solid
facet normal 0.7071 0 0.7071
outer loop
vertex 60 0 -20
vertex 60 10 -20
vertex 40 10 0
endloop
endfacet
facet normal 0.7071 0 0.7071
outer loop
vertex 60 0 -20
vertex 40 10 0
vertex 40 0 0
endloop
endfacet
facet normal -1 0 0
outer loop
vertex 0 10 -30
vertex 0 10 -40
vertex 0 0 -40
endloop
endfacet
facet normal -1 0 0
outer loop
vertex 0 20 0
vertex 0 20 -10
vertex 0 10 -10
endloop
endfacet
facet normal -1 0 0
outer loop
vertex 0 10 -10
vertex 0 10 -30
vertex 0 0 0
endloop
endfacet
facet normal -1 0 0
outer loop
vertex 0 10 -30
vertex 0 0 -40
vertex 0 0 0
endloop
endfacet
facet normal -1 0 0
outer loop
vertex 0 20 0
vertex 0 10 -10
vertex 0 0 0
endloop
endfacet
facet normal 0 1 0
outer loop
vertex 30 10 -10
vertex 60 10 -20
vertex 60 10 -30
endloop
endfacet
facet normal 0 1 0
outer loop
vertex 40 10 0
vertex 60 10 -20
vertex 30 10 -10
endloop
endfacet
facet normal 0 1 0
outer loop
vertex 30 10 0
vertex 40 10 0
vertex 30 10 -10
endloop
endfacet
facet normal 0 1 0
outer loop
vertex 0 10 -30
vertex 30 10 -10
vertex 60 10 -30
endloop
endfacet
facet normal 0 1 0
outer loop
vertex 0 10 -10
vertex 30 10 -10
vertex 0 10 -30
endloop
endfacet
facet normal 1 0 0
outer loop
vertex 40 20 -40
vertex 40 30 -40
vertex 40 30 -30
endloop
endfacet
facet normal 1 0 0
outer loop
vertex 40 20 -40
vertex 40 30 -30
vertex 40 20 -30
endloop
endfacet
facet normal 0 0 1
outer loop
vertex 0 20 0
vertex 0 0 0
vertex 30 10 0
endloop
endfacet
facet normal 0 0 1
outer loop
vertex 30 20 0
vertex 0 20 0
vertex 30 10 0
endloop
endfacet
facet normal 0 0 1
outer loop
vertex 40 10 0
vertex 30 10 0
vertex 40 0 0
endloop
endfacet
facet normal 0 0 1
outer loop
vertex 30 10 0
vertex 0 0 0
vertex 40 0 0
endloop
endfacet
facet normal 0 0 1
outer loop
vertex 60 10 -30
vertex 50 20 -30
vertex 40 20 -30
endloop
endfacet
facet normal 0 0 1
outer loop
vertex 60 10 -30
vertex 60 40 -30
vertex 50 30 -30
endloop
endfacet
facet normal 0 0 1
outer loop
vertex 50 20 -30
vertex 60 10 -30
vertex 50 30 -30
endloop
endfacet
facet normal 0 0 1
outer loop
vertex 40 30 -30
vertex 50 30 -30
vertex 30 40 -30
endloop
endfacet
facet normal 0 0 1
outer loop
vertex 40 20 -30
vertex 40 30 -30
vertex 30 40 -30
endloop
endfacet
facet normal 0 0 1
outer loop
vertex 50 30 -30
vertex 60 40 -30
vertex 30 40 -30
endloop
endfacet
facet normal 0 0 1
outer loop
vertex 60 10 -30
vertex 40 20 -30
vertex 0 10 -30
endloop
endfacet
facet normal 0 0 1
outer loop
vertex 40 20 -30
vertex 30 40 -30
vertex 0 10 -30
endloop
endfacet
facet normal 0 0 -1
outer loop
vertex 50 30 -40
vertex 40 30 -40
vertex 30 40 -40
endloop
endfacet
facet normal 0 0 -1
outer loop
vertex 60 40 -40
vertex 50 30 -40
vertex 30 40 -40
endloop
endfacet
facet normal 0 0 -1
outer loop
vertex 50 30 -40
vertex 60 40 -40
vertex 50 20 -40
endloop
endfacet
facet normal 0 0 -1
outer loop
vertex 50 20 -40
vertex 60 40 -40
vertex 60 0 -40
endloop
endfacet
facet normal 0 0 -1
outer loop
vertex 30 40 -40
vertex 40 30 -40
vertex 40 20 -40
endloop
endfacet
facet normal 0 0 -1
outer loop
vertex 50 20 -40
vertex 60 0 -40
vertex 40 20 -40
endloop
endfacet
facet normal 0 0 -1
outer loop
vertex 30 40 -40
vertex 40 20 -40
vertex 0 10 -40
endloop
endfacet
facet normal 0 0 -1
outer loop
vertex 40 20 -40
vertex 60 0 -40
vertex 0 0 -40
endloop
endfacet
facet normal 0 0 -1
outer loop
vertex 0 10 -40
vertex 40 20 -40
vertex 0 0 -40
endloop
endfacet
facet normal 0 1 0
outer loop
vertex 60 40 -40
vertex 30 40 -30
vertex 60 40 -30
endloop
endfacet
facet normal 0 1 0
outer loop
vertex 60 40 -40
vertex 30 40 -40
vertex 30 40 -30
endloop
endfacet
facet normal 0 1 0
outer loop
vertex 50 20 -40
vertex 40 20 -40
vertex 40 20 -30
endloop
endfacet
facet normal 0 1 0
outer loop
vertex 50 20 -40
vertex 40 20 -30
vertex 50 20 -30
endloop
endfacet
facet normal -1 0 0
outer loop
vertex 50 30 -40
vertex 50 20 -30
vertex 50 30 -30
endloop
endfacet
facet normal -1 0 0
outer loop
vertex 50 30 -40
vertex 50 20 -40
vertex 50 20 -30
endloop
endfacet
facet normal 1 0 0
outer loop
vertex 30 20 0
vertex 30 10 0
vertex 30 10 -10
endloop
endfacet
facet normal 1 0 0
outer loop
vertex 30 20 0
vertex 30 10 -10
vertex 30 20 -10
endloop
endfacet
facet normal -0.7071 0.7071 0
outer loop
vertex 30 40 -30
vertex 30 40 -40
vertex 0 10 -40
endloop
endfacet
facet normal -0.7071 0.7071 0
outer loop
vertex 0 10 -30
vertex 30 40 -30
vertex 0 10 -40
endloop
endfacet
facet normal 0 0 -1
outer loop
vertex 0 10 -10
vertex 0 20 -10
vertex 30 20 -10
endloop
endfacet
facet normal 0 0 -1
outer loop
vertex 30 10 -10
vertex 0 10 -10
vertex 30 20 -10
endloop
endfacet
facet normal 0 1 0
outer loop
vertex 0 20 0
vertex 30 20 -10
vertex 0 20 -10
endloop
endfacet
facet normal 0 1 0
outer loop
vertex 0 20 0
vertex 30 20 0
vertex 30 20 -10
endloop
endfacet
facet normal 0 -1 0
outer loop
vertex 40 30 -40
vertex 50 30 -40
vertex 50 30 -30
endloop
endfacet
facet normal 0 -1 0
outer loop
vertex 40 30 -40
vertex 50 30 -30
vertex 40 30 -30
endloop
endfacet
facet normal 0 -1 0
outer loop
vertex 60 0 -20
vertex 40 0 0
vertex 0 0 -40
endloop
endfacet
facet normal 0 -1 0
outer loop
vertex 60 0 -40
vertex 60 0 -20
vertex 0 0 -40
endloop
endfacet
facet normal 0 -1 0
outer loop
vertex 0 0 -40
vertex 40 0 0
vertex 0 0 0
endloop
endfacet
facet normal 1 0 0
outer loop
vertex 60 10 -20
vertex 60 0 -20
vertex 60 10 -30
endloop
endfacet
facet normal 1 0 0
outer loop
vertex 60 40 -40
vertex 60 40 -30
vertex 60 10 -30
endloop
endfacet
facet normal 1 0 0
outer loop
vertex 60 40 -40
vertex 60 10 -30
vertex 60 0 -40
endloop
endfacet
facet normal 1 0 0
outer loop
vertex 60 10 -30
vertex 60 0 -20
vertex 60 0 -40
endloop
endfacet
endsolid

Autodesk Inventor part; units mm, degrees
ref_plane "YZ Plane" through (0, 0, 0) normal (1, 0, 0) x (0, 1, 0)
ref_plane "XZ Plane" through (0, 0, 0) normal (0, 1, 0) x (-1, 0, 0)
ref_plane "XY Plane" through (0, 0, 0) normal (0, 0, 1) x (1, 0, 0)
sketch "草圖1" plane through (0, 0, 0) normal (0, 1, 0) x (-1, 0, 0)
  line L0 (0, 0) -> (-60, 0)
  line L1 (-60, 0) -> (-60, -40)
  line L2 (-60, -40) -> (0, -40)
  line L3 (0, -40) -> (0, 0)
  dimension "d0" = 40
  dimension "d1" = 60
extrude "擠出1" add sketch "草圖1" along normal blind 10
sketch "草圖2" plane through (0, 0, 0) normal (0, 0, 1) x (1, 0, 0)
  line L0 (0, 10) -> (60, 10) projected
  line L1 (0, 10) -> (30, 10)
  line L2 (30, 10) -> (30, 20)
  line L3 (30, 20) -> (0, 20)
  line L4 (0, 20) -> (0, 10)
  point P0 (0, 0)
  dimension "d4" = 30
  dimension "d5" = 10
extrude "擠出2" add sketch "草圖2" against normal blind 10
sketch "草圖3" plane through (60, 0, -40) normal (0, 0, -1) x (-1, 0, 0)
  line L0 (0, 10) -> (60, 10) projected
  line L1 (0, 10) -> (30, 10)
  line L2 (30, 10) -> (30, 40)
  line L3 (30, 40) -> (0, 40)
  line L4 (0, 40) -> (0, 10)
  line L5 (60, 0) -> (60, 10) projected
  line L6 (30, 40) -> (60, 10)
  line L7 (10, 30) -> (20, 30)
  line L8 (20, 30) -> (20, 20)
  line L9 (20, 20) -> (10, 20)
  line L10 (10, 20) -> (10, 30)
  dimension "d8" = 30
  dimension "d9" = 30
  dimension "d10" = 10
extrude "擠出3" add sketch "草圖3" against normal blind 10
chamfer "倒角1" distance 20 angle 45 1 edges at (60, 5, 0)
properties part number "12"
